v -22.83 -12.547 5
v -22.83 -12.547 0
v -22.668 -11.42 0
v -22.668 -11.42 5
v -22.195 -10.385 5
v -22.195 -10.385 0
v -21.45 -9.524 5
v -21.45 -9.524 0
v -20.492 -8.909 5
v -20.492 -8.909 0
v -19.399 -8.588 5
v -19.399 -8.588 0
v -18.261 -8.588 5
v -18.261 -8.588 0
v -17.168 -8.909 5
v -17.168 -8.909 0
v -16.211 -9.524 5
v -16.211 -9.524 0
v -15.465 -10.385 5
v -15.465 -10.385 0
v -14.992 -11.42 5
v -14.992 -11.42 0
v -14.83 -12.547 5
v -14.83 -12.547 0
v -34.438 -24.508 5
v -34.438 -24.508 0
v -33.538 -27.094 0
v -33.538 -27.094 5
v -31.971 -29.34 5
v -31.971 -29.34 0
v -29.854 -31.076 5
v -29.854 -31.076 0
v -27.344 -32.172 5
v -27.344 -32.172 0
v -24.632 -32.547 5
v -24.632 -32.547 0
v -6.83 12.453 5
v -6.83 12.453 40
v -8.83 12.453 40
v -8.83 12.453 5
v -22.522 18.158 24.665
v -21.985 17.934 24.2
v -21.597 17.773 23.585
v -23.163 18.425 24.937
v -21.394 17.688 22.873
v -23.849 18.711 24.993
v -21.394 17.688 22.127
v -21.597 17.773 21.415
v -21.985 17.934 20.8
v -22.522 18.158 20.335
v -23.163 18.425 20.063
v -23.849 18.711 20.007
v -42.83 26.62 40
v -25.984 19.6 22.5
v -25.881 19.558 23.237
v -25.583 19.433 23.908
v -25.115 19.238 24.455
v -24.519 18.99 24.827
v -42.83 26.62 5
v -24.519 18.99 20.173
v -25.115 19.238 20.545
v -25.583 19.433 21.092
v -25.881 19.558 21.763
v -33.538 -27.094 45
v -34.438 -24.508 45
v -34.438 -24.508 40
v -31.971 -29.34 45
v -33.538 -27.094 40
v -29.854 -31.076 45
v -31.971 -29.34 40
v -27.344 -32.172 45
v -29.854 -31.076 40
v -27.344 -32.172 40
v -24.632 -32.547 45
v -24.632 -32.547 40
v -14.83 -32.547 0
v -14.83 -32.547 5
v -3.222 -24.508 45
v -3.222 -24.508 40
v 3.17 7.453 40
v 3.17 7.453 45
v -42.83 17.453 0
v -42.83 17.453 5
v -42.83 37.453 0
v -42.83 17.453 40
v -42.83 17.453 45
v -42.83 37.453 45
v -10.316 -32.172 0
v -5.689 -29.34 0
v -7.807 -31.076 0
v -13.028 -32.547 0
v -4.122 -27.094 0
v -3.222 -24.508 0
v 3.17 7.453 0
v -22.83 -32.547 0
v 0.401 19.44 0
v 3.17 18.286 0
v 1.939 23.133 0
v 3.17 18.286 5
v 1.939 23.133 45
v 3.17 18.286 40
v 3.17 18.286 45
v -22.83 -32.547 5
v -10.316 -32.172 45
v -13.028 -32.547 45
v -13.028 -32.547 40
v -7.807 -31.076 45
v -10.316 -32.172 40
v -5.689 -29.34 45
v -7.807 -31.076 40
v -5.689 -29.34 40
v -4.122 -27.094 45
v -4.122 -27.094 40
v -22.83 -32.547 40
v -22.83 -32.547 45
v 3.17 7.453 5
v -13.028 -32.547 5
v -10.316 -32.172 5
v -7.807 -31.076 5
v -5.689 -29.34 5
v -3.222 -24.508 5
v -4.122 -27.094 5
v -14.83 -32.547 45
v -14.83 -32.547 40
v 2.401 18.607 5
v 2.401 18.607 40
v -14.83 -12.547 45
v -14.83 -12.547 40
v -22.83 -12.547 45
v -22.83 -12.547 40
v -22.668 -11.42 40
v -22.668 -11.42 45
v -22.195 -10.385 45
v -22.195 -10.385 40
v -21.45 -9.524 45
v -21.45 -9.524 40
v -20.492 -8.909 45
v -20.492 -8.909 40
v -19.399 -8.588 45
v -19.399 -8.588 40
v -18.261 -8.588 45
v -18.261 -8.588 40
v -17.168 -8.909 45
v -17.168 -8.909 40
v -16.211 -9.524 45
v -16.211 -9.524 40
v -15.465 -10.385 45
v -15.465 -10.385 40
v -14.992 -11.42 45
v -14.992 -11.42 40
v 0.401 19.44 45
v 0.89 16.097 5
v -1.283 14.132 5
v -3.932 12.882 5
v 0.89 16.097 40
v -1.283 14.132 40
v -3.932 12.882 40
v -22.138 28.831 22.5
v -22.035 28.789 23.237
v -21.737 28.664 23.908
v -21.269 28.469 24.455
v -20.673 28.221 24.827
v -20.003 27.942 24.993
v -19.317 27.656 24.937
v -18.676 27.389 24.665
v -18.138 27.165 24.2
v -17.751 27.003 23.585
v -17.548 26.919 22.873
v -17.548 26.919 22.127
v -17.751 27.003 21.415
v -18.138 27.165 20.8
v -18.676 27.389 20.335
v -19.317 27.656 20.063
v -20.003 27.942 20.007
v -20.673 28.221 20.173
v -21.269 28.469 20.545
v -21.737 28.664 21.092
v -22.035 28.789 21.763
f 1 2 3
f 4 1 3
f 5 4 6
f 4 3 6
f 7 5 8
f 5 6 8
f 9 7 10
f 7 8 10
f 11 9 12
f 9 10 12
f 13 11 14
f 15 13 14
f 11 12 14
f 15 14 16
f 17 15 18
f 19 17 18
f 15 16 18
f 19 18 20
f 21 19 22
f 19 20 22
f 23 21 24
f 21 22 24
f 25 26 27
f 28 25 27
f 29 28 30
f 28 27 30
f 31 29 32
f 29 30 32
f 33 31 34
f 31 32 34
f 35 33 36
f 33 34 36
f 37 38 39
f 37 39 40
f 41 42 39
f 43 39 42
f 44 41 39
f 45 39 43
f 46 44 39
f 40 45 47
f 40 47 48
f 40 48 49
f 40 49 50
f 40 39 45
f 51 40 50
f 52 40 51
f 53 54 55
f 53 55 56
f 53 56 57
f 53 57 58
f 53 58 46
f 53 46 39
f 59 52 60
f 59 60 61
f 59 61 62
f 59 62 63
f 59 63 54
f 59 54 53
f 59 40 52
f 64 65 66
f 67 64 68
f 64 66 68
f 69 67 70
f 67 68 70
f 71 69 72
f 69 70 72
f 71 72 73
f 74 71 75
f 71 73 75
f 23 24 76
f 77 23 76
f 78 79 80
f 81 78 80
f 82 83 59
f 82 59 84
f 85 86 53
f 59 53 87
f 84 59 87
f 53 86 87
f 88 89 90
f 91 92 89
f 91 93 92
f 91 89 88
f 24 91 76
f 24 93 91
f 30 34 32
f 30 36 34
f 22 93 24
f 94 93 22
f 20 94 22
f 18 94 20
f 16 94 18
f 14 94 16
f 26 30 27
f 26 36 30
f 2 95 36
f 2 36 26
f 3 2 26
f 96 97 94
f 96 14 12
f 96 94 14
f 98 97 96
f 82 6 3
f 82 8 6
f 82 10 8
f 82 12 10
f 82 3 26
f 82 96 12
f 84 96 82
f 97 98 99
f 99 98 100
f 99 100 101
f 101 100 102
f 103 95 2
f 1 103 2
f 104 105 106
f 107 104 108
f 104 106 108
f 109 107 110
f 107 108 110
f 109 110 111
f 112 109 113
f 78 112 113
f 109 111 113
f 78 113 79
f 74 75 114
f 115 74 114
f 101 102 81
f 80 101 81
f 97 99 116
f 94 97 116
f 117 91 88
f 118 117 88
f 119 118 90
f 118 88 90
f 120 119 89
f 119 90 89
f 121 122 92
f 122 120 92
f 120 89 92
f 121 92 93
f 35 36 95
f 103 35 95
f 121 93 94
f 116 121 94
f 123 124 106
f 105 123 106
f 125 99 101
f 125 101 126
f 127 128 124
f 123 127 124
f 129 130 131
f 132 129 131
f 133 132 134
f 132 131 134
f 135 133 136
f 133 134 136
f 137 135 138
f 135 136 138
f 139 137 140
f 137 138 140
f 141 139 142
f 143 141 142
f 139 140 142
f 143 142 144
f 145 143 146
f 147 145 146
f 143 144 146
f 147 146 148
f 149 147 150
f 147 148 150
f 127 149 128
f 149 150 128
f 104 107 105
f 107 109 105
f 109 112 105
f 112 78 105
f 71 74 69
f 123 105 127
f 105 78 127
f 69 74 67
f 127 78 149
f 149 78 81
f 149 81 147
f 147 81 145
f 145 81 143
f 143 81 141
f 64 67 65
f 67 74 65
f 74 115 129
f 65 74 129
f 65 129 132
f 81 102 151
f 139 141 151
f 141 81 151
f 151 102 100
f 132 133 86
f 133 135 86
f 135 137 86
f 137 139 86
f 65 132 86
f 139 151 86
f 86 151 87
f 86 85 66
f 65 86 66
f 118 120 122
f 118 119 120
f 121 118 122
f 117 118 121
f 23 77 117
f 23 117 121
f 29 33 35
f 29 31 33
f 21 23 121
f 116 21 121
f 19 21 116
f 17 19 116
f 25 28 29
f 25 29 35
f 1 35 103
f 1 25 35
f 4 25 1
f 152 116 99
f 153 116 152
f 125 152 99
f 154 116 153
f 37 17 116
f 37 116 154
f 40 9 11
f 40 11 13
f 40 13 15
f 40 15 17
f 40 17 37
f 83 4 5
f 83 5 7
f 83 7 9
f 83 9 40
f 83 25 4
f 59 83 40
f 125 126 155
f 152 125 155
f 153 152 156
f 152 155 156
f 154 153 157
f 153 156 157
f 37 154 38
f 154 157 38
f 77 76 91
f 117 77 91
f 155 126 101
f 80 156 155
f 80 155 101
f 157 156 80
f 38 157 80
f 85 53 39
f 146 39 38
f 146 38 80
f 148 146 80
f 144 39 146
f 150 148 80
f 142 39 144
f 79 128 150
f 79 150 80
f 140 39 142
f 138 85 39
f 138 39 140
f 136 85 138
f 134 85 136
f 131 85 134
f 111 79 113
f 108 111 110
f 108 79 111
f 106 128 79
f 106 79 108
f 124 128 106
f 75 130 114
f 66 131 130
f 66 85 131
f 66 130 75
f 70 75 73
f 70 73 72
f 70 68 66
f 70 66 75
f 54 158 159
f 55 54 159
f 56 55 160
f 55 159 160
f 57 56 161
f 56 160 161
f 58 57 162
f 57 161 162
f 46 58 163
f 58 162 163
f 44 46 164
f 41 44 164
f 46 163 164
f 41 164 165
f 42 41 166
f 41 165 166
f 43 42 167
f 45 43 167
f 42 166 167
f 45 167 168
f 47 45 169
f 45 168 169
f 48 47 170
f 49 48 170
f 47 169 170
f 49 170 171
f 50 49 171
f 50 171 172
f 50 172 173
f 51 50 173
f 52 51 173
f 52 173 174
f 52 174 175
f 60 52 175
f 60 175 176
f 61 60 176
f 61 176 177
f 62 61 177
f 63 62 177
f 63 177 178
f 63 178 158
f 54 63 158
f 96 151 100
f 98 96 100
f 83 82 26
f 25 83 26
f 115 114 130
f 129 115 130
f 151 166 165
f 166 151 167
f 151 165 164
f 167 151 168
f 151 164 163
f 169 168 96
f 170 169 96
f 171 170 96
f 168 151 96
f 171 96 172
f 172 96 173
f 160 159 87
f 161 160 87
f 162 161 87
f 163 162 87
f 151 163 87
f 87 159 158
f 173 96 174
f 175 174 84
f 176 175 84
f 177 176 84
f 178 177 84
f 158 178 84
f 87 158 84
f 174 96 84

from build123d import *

# Parameters (mm, degrees)
SALIENTE_EXTRUIR1_DEPTH      = 45
CORTAR_EXTRUIR1_DEPTH        = 35
CORTAR_EXTRUIR1_DEPTH_BACK   = 25
SALIENTE_EXTRUIR2_DEPTH      = 0.0001
SALIENTE_EXTRUIR2_DEPTH_BACK = 10
CORTAR_EXTRUIR2_DEPTH        = 50.0001
CROQUIS5_R                   = 2.5
CORTAR_EXTRUIR3_DEPTH        = 20
CROQUIS6_W                   = 35
CROQUIS6_H                   = 5
CORTAR_EXTRUIR4_DEPTH        = 50
REDONDEO7_R                  = 10
SALIENTE_EXTRUIR3_DEPTH      = 45


with BuildPart() as part:
    # Croquis1 → Saliente-Extruir1 (new body)
    with BuildSketch(Plane.XY):
        with BuildLine():
            Line((5.169872345, 17.452931937), (-42.830127655, 37.452931937))
            Line((-42.830127655, 37.452931937), (-42.830127655, 17.452931937))
            Line((-42.830127655, 17.452931937), (-34.437895384, -24.508229414))
            ThreePointArc((-34.437895384, -24.508229414), (-30.971977683, -30.280489476), (-24.632088627, -32.547068063))
            Line((-24.632088627, -32.547068063), (-22.830127655, -32.547068063))
            Line((-22.830127655, -32.547068063), (-22.830127655, -12.547068063))
            ThreePointArc((-22.830127655, -12.547068063), (-18.830127655, -8.547068063), (-14.830127655, -12.547068063))
            Line((-14.830127655, -12.547068063), (-14.830127655, -32.547068063))
            Line((-14.830127655, -32.547068063), (-13.028166682, -32.547068063))
            ThreePointArc((-13.028166682, -32.547068063), (-6.688277626, -30.280489476), (-3.222359925, -24.508229414))
            Line((-3.222359925, -24.508229414), (5.169872345, 17.452931937))
        make_face()
    extrude(amount=SALIENTE_EXTRUIR1_DEPTH)

    # Croquis2 → Cortar-Extruir1 (cut, two sides: drawn at the far end of the back side and taken through both)
    with BuildSketch(Plane(origin=(-22.830127655, 0, 0), x_dir=(0, 0, -1), z_dir=(1, 0, 0)).offset(-CORTAR_EXTRUIR1_DEPTH_BACK)):
        Polygon((-40, -32.547068063), (-5, -32.547068063), (-5, 11.74295153), (-5, 27.452931937), (-40, 27.382795607), (-40, 11.74295153), align=None)
    extrude(amount=CORTAR_EXTRUIR1_DEPTH + CORTAR_EXTRUIR1_DEPTH_BACK, mode=Mode.SUBTRACT)

    # Croquis3 → Saliente-Extruir2 (add, two sides: drawn at the far end of the back side and taken through both)
    with BuildSketch(Plane(origin=(6.961081212, 16.706594909, 0), x_dir=(0.9230769230769231, -0.38461538461538447, 0), z_dir=(0.38461538461538447, 0.9230769230769231, 0)).offset(-SALIENTE_EXTRUIR2_DEPTH_BACK)):
        Polygon((-53.940476272, -45), (-53.940476272, 0), (-1.940476272, 0), (5.740404043, 0), (5.740404043, -45), (-1.940476272, -45), align=None)
    extrude(amount=SALIENTE_EXTRUIR2_DEPTH + SALIENTE_EXTRUIR2_DEPTH_BACK)

    # Croquis4 → Cortar-Extruir2 (cut)
    with BuildSketch(Plane.XY.offset(45)):
        Polygon((-42.830127655, 17.452931937), (-42.830127655, 41.659540507), (3.169872345, 41.659540507), (3.169872345, 7.452931937), (4.911234771, 4.934595431), (17.135740174, 1.881036512), (16.246125069, 53.47871262), (-56.321049949, 53.47871262), (-56.321049949, 17.452931937), align=None)
    extrude(amount=-CORTAR_EXTRUIR2_DEPTH, mode=Mode.SUBTRACT)

    # Croquis5 → Cortar-Extruir3 (cut)
    with BuildSketch(Plane(origin=(6.961119674, 16.706687217, 0), x_dir=(0.9230769230769231, -0.3846153846153847, 0), z_dir=(0.38461538461538464, 0.923076923076923, 0))):
        with Locations(Location((-29.023830439, -22.5, 0), (0, 0, 180))):
            Circle(CROQUIS5_R)
    extrude(amount=-CORTAR_EXTRUIR3_DEPTH, mode=Mode.SUBTRACT)

    # Croquis6 → Cortar-Extruir4 (cut)
    with BuildSketch(Plane(origin=(3.169872345, 0, 0), x_dir=(0, 0, -1), z_dir=(1, 0, 0))):
        with Locations((-22.5, 9.952931937)):
            Rectangle(CROQUIS6_W, CROQUIS6_H)
    extrude(amount=-CORTAR_EXTRUIR4_DEPTH, mode=Mode.SUBTRACT)

    # Redondeo7
    # the kernel refuses this fillet: 10 mm, written as the material it takes off along each edge
    with BuildSketch(Plane(origin=(3.169872345, 12.452931937, 40), x_dir=(-1, 0, 0), z_dir=(0, 0, -1))) as redondeo7_piece_1:
        with BuildLine():
            CenterArc((REDONDEO7_R, REDONDEO7_R), REDONDEO7_R, 180, 90)
            Line((0, REDONDEO7_R), (0, 0))
            Line((0, 0), (REDONDEO7_R, 0))
        make_face()
    extrude(amount=35, mode=Mode.SUBTRACT)

    # Croquis7 → Saliente-Extruir3 (add)
    with BuildSketch(Plane.XY.offset(45)):
        Polygon((0.400641576, 19.440219758), (1.939103115, 23.13252745), (3.169872345, 18.286373604), align=None)
    extrude(amount=-SALIENTE_EXTRUIR3_DEPTH)


solid = part.part
